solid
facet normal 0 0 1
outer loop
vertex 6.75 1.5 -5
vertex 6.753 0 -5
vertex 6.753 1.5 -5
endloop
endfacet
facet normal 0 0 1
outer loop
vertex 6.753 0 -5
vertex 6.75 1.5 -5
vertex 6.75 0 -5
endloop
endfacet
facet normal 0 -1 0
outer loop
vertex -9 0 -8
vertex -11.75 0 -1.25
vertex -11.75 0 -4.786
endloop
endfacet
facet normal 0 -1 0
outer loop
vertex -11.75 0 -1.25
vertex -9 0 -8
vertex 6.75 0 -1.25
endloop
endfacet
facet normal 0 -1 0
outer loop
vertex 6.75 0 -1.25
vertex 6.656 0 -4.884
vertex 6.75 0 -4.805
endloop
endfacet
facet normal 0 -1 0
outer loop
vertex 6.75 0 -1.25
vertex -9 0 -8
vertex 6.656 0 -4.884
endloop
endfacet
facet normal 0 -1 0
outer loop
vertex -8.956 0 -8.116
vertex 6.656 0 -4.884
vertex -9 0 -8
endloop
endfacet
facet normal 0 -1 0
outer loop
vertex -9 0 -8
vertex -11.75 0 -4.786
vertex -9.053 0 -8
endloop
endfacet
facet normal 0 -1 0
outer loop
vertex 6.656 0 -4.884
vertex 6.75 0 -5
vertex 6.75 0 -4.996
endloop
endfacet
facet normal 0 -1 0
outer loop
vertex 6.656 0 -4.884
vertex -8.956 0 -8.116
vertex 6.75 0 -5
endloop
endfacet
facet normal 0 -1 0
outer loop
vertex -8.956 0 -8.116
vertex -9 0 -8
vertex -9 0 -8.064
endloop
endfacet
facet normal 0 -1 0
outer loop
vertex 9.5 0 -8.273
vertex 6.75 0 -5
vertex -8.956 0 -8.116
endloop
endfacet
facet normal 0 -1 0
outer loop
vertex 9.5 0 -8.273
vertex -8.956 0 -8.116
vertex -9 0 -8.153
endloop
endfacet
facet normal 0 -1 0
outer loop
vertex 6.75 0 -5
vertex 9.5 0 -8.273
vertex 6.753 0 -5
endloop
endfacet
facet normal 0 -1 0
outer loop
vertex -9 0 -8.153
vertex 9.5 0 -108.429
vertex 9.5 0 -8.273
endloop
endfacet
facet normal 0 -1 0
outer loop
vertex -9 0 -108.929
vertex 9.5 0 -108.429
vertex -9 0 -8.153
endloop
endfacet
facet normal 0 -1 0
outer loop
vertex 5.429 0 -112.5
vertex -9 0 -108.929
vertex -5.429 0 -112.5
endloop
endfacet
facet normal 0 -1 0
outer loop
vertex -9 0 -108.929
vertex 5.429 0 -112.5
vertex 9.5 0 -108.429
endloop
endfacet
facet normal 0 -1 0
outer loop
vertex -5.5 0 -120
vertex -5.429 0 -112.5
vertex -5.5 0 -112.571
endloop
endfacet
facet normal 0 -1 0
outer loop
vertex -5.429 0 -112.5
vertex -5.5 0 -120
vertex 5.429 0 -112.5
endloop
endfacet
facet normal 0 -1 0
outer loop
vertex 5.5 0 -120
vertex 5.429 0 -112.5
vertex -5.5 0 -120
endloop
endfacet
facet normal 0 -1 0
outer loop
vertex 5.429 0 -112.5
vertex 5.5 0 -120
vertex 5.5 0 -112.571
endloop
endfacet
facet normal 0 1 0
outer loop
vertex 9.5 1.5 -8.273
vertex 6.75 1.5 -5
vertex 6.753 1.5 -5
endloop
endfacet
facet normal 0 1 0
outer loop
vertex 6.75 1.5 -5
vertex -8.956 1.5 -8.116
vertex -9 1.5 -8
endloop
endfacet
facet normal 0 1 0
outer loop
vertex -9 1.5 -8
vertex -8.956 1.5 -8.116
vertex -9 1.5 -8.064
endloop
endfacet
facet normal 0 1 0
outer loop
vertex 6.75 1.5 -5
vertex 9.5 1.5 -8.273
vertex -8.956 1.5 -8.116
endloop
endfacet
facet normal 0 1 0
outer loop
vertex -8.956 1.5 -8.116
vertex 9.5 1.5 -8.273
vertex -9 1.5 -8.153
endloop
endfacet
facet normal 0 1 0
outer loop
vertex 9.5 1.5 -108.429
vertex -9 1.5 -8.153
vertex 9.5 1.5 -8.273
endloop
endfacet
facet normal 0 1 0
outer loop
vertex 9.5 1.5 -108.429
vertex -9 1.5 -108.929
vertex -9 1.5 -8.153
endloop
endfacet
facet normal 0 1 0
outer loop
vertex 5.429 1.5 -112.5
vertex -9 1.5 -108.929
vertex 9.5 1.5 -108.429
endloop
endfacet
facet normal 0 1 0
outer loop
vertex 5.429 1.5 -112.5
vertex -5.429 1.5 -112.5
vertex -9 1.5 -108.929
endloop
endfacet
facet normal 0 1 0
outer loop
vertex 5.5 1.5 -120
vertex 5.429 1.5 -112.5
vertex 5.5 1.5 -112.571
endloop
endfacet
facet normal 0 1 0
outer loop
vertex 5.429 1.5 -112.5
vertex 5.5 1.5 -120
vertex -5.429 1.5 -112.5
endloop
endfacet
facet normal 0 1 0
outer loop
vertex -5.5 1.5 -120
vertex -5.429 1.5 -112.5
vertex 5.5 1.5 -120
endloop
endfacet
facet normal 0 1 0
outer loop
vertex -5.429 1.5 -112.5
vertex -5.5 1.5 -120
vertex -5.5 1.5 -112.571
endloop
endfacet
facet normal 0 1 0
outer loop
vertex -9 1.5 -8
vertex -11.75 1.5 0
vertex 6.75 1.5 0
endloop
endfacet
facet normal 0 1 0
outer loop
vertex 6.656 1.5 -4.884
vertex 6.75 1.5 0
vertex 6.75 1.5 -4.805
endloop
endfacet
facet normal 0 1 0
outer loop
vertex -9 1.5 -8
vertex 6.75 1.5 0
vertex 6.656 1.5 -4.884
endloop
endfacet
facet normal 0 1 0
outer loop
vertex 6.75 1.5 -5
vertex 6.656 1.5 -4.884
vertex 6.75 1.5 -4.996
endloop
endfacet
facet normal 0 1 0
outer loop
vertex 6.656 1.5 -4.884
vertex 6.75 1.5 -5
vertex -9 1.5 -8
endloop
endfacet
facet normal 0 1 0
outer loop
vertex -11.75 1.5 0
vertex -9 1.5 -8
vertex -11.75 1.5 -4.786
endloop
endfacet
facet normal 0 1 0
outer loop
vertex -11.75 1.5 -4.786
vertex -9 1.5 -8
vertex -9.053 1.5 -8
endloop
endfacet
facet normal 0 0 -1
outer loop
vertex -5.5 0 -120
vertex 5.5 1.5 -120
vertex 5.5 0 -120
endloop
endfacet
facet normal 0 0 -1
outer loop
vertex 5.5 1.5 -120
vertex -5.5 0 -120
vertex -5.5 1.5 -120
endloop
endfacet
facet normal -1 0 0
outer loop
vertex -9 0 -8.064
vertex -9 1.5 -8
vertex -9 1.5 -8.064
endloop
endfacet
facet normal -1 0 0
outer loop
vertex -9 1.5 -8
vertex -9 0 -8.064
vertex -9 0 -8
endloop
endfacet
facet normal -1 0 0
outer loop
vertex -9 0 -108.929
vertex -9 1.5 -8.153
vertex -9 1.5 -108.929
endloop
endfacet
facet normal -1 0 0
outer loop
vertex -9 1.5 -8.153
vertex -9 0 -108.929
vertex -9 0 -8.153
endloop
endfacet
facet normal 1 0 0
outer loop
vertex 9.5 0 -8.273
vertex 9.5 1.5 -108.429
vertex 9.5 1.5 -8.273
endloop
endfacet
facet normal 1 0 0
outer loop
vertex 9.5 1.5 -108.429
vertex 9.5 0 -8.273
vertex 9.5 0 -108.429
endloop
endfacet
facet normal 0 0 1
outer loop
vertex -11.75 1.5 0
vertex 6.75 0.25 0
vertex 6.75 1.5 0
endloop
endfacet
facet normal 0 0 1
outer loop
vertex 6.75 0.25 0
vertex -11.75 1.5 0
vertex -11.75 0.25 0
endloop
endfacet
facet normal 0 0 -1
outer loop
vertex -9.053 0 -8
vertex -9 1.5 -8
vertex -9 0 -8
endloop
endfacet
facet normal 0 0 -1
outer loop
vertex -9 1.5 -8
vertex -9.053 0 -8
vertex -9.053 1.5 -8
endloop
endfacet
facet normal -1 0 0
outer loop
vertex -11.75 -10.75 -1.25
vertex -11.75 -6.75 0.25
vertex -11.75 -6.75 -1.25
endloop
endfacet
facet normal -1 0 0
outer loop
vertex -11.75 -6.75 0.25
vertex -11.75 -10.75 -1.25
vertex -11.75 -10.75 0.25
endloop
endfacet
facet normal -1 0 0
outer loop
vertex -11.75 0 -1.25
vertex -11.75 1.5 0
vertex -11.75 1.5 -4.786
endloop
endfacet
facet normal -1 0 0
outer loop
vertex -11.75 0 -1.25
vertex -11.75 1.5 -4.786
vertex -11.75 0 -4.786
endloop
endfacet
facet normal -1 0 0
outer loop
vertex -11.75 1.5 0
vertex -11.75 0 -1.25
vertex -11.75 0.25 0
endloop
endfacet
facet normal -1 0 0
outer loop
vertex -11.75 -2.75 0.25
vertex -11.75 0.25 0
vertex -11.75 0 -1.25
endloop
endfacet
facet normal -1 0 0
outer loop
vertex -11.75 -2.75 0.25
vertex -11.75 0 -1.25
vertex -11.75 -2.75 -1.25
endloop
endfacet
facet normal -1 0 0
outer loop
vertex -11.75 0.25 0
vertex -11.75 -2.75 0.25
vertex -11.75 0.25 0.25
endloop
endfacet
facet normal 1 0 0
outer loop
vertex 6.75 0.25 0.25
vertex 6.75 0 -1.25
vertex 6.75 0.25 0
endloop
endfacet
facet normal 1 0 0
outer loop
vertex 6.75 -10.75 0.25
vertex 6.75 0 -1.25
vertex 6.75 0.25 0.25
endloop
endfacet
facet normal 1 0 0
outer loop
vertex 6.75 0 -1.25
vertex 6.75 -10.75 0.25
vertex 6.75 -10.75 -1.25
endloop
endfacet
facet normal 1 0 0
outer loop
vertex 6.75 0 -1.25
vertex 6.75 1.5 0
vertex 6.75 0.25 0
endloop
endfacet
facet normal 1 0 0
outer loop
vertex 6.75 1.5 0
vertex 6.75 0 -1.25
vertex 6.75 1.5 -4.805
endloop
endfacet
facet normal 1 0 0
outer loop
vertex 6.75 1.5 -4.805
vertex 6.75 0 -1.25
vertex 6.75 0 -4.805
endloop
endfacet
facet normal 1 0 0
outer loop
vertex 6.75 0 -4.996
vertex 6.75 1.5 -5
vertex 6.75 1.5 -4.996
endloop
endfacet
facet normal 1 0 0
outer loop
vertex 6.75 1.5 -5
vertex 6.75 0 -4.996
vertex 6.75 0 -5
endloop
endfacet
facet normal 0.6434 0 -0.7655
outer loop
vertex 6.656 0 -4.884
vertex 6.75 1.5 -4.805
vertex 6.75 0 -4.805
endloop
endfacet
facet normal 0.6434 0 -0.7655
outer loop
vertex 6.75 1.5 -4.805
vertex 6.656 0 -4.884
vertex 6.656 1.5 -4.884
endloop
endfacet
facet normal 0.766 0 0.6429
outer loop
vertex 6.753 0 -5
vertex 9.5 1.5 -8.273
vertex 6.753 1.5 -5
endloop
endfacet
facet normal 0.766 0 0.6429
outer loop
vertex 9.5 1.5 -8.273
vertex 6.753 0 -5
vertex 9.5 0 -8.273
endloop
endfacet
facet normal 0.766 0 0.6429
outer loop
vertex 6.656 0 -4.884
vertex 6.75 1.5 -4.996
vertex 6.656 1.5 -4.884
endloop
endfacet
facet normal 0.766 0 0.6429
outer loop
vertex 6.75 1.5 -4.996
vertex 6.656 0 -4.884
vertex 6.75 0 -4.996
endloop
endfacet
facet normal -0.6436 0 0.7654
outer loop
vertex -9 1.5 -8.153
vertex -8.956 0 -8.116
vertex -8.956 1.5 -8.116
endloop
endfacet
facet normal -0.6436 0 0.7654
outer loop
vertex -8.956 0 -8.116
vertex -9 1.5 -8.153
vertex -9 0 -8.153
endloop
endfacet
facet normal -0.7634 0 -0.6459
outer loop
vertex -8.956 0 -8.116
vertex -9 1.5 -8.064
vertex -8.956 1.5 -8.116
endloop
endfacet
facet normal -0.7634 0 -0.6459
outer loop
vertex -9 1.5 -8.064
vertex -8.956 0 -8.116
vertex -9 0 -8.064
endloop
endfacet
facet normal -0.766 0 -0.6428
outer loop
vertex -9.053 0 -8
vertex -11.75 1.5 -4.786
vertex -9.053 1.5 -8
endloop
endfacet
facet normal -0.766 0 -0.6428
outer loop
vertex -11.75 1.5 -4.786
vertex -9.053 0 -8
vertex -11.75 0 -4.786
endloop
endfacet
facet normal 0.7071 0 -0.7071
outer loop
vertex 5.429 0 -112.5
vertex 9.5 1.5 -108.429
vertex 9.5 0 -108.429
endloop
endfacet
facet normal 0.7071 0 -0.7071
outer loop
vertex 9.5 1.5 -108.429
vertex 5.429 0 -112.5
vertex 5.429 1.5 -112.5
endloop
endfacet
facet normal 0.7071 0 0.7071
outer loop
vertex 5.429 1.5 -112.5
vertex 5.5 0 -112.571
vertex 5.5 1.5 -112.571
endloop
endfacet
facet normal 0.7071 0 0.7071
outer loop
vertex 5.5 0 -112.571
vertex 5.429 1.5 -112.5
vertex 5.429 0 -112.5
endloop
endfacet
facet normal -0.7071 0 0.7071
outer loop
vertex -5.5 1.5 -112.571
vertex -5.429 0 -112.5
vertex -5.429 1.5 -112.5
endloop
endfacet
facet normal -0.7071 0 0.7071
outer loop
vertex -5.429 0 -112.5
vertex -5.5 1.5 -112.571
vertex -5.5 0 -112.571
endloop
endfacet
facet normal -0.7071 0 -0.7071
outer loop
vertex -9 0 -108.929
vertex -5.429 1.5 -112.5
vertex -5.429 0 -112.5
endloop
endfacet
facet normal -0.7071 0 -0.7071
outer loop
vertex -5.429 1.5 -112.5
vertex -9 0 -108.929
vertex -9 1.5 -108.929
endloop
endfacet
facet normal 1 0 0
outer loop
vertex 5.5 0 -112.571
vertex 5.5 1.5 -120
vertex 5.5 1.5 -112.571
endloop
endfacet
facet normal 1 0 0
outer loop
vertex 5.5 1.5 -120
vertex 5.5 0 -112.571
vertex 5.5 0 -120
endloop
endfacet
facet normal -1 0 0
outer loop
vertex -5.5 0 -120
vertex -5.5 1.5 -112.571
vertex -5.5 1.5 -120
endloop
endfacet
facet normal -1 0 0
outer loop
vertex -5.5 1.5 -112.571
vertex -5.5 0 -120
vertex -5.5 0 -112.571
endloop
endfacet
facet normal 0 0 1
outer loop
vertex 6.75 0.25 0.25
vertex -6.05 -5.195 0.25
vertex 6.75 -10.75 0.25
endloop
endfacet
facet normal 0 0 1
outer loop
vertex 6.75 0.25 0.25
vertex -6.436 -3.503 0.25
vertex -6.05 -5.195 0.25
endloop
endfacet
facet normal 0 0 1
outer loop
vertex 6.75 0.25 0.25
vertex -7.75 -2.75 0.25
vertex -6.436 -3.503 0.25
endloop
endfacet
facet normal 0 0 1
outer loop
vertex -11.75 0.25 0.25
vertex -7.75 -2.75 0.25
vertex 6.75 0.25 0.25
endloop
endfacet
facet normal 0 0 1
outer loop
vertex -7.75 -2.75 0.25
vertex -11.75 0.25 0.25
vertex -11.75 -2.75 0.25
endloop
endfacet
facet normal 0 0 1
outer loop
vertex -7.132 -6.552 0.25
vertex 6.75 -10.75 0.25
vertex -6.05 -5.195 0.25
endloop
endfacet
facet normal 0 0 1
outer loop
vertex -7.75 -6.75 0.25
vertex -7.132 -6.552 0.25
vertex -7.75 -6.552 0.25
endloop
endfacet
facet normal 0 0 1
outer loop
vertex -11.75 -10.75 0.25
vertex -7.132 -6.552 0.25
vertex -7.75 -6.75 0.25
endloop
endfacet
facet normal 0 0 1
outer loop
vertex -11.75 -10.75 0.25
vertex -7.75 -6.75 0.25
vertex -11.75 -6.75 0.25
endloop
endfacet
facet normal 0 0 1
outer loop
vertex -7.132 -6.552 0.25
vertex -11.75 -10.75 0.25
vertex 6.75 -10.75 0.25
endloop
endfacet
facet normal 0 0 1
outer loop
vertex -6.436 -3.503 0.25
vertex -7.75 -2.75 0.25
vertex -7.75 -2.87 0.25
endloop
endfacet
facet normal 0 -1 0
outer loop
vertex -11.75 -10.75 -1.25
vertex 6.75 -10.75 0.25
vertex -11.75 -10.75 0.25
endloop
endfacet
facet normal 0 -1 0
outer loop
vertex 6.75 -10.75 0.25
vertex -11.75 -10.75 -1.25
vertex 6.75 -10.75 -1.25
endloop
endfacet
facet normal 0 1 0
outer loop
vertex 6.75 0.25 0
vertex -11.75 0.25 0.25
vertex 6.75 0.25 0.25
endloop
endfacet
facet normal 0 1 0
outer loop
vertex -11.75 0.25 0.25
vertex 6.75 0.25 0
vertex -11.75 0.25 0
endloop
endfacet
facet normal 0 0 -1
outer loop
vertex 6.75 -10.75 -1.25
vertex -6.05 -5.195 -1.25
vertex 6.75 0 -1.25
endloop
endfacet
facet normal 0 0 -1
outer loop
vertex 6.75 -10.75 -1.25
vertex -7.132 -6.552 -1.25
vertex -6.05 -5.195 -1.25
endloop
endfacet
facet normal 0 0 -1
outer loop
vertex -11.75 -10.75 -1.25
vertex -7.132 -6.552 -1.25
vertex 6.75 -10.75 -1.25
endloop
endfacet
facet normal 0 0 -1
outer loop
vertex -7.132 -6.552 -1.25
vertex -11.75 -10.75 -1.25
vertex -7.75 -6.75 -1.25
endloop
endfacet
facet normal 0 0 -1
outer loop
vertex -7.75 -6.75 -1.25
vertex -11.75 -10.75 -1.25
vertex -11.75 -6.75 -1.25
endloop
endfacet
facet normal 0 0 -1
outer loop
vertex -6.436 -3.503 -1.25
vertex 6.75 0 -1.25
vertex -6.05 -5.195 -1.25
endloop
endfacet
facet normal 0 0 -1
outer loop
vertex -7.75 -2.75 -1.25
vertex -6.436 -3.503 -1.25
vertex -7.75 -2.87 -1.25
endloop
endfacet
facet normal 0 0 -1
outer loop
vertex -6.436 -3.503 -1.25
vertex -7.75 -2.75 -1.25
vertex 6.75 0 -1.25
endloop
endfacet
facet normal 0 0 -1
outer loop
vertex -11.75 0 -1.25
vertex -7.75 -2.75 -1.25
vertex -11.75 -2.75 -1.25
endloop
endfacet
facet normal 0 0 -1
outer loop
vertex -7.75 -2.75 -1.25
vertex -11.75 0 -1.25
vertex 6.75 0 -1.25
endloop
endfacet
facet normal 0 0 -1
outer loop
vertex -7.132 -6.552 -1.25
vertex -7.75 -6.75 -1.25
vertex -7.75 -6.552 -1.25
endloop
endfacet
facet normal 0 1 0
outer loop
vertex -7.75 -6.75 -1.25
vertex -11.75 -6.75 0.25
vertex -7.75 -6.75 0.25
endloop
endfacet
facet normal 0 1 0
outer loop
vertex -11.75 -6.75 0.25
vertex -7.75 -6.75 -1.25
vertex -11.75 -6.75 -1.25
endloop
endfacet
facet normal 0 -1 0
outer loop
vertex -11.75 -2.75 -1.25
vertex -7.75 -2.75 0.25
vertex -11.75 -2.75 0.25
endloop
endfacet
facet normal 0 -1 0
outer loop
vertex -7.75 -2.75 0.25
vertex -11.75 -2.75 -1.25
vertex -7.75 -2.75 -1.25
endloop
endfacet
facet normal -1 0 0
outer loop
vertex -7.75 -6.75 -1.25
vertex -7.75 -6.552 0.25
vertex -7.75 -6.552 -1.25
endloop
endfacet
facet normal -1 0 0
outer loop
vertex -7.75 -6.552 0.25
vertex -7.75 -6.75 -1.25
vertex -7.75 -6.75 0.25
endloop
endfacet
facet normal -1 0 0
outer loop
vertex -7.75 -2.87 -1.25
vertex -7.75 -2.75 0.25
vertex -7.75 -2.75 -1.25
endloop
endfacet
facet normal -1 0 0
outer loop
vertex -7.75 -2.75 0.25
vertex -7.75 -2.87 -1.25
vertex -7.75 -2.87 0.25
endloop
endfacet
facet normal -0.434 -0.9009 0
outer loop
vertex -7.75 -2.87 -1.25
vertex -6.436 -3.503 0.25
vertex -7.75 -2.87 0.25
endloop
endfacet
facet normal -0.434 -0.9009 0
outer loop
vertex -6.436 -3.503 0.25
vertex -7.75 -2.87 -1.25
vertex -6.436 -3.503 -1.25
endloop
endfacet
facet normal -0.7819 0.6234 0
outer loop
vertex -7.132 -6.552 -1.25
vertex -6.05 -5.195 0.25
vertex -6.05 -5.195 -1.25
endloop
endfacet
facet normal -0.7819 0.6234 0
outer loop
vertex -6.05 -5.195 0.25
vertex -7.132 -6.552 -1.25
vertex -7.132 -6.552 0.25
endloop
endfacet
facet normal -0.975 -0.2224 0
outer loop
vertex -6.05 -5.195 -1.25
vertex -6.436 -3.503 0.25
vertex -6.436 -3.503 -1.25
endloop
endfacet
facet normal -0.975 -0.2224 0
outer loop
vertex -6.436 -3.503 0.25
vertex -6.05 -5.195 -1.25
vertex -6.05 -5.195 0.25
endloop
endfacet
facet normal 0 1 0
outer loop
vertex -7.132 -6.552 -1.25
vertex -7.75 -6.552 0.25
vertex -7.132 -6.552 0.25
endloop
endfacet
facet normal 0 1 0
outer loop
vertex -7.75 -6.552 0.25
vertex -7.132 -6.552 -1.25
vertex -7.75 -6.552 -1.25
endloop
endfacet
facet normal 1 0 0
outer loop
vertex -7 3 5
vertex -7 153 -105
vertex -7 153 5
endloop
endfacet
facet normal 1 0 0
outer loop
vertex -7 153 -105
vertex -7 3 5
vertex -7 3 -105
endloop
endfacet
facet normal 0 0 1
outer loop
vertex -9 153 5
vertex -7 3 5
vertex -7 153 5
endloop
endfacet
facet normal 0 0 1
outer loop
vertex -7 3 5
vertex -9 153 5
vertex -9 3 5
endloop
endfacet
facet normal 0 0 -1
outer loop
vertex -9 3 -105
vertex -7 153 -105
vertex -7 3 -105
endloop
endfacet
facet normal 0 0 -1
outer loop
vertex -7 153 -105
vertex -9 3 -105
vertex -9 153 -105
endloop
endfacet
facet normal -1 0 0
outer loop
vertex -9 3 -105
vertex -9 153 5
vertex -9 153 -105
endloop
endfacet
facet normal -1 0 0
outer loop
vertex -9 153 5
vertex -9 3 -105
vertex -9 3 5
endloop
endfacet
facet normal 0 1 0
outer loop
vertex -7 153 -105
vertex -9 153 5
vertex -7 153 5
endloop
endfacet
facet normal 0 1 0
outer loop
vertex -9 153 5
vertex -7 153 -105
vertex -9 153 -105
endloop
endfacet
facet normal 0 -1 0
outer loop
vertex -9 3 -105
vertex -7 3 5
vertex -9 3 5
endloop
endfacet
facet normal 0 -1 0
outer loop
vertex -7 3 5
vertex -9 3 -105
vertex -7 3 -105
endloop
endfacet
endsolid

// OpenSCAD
thickness=1.5;

module pci_bracket() {
union() {
difference() {
union () {
translate([0,-0.25,0]) cube([115,18.5,thickness],center=true);
translate([58.5,2.5,0]) cube([8,18.5,thickness],center=true);
}
translate([57,-13.7,0]) rotate([0,0,40]) cube([10,10,10],center=true);
translate([55,16,0]) rotate([0,0,40]) cube([10,10,10],center=true);
translate([-50,-12.5,0]) rotate([0,0,45]) cube([10,10,10],center=true);
translate([-50,12.5,0]) rotate([0,0,45]) cube([10,10,10],center=true);
translate([-55,-10.5,0]) cube([10,10,10],center=true);
translate([-55,10.5,0]) cube([10,10,10],center=true);
}
difference() {
translate([62,2.5,6]) cube([thickness,18.5,11],center=true);
translate([62,10.75,5.5]) cube([2,6,4],center=true);
translate([62,8,5.5]) rotate([0,90,0]) cylinder(r=2,h=2,center=true);
}
}
}

module pcie_pcbboard() {
    difference(){
    cube([2, 150, 110],center=true);
    }
}

module pcie10g()
{
    //translate([0,-2.5,1])cube([30, 5, 2],center=true);
    //translate([0,1,-60])cube([20, 2, 120],center=true);
    translate([-8,78,-120+15+110/2])pcie_pcbboard();
    translate([0,1.5/2,-62.5])rotate([90,-90,0])pci_bracket();
}

module pciegpu()
{
    translate([0,-2.5,1])cube([30, 5, 2],center=true);
    translate([0,1,-60])cube([20, 2, 120],center=true);
    translate([-9,125,-60])cube([2, 250, 120],center=true);
}





module itxboard()
{
    difference(){
    translate([0,0,1])cube([170, 170, 2]);
    //translate([170/2,170/2,0])cube([150, 150, 10],center=true);
    //0.25, h-0.4
    translate([6.35, 170-10.16,0])cylinder(10, r=2,center=true,$fn=50);
    //0.25, h-0.4-6.1
    translate([6.35, 170-10.16-154.94,0])cylinder(10, r=2,center=true,$fn=50);
    //0.25+6.2, h-0.4-0.9
    translate([6.35+157.48, 170-10.16-22.86,0])cylinder(10, r=2,center=true,$fn=50);
    //0.25, h-0.4-6.1
    translate([6.35+157.48, 170-10.16-154.94,0])cylinder(10, r=2,center=true,$fn=50);
    }
}

module itxtop(){
    //top
    translate([120,170,0])cube([50,10,2]);
    translate([60,170,0])cube([50,10,2]);
    translate([0,170,0])cube([50,10,2]);

    //bot
    translate([120,-10,0])cube([50,10,2]);
    translate([60,-10,0])cube([50,10,2]);
    translate([0,-10,0])cube([50,10,2]);

    //left
    translate([-10,120,0])cube([10,50,2]);
    translate([-10,60,0])cube([10,50,2]);
    translate([-10,0,0])cube([10,50,2]);

    //right
    translate([170,120,0])cube([10,50,2]);
    translate([170,60,0])cube([10,50,2]);
    translate([170,0,0])cube([10,50,2]);

    difference(){
    translate([0, 0, 0])cube([170, 170, 2]);
    translate([170/2,170/2,0])cube([150, 150, 10],center=true);
    //0.25, h-0.4
    translate([6.35, 170-10.16,0])cylinder(10, r=2,center=true,$fn=50);
    //0.25, h-0.4-6.1
    translate([6.35, 170-10.16-154.94,0])cylinder(10, r=2,center=true,$fn=50);
    //0.25+6.2, h-0.4-0.9
    translate([6.35+157.48, 170-10.16-22.86,0])cylinder(10, r=2,center=true,$fn=50);
    //0.25, h-0.4-6.1
    translate([6.35+157.48, 170-10.16-154.94,0])cylinder(10, r=2,center=true,$fn=50);
    }
}

module power()
{
    cube([80, 150, 150],center=true);
}

module itxcase()
{
    translate([0,1,0])cube([200,2,150],center=true);
    difference(){
        translate([0,199,0])cube([200,2,150],center=true);
        translate([0,199,-15])cube([180,3,130],center=true);
    }
    difference(){
        translate([-99,100,0])cube([2,200,150],center=true);
        translate([-99,100,0])cube([4,180,100],center=true);
    }
    difference(){
        translate([ 99,100,0])cube([2,200,150],center=true);
        translate([ 99,100,0])cube([3,180,100],center=true);
    }
}


/*
//color("#ff00ff")translate([15,15,150+2])itxboard();

translate([185, 185, 150])rotate([0,0,180])itxtop();

color("#ff0000")translate([40+2,75+2,75])power();
color("#00ff00")translate([110, 2, 120])pcie10g();
color("#00ff00")translate([160, 2, 120])pciegpu();

translate([100, 0, 75])itxcase();
*/


pcie10g();
